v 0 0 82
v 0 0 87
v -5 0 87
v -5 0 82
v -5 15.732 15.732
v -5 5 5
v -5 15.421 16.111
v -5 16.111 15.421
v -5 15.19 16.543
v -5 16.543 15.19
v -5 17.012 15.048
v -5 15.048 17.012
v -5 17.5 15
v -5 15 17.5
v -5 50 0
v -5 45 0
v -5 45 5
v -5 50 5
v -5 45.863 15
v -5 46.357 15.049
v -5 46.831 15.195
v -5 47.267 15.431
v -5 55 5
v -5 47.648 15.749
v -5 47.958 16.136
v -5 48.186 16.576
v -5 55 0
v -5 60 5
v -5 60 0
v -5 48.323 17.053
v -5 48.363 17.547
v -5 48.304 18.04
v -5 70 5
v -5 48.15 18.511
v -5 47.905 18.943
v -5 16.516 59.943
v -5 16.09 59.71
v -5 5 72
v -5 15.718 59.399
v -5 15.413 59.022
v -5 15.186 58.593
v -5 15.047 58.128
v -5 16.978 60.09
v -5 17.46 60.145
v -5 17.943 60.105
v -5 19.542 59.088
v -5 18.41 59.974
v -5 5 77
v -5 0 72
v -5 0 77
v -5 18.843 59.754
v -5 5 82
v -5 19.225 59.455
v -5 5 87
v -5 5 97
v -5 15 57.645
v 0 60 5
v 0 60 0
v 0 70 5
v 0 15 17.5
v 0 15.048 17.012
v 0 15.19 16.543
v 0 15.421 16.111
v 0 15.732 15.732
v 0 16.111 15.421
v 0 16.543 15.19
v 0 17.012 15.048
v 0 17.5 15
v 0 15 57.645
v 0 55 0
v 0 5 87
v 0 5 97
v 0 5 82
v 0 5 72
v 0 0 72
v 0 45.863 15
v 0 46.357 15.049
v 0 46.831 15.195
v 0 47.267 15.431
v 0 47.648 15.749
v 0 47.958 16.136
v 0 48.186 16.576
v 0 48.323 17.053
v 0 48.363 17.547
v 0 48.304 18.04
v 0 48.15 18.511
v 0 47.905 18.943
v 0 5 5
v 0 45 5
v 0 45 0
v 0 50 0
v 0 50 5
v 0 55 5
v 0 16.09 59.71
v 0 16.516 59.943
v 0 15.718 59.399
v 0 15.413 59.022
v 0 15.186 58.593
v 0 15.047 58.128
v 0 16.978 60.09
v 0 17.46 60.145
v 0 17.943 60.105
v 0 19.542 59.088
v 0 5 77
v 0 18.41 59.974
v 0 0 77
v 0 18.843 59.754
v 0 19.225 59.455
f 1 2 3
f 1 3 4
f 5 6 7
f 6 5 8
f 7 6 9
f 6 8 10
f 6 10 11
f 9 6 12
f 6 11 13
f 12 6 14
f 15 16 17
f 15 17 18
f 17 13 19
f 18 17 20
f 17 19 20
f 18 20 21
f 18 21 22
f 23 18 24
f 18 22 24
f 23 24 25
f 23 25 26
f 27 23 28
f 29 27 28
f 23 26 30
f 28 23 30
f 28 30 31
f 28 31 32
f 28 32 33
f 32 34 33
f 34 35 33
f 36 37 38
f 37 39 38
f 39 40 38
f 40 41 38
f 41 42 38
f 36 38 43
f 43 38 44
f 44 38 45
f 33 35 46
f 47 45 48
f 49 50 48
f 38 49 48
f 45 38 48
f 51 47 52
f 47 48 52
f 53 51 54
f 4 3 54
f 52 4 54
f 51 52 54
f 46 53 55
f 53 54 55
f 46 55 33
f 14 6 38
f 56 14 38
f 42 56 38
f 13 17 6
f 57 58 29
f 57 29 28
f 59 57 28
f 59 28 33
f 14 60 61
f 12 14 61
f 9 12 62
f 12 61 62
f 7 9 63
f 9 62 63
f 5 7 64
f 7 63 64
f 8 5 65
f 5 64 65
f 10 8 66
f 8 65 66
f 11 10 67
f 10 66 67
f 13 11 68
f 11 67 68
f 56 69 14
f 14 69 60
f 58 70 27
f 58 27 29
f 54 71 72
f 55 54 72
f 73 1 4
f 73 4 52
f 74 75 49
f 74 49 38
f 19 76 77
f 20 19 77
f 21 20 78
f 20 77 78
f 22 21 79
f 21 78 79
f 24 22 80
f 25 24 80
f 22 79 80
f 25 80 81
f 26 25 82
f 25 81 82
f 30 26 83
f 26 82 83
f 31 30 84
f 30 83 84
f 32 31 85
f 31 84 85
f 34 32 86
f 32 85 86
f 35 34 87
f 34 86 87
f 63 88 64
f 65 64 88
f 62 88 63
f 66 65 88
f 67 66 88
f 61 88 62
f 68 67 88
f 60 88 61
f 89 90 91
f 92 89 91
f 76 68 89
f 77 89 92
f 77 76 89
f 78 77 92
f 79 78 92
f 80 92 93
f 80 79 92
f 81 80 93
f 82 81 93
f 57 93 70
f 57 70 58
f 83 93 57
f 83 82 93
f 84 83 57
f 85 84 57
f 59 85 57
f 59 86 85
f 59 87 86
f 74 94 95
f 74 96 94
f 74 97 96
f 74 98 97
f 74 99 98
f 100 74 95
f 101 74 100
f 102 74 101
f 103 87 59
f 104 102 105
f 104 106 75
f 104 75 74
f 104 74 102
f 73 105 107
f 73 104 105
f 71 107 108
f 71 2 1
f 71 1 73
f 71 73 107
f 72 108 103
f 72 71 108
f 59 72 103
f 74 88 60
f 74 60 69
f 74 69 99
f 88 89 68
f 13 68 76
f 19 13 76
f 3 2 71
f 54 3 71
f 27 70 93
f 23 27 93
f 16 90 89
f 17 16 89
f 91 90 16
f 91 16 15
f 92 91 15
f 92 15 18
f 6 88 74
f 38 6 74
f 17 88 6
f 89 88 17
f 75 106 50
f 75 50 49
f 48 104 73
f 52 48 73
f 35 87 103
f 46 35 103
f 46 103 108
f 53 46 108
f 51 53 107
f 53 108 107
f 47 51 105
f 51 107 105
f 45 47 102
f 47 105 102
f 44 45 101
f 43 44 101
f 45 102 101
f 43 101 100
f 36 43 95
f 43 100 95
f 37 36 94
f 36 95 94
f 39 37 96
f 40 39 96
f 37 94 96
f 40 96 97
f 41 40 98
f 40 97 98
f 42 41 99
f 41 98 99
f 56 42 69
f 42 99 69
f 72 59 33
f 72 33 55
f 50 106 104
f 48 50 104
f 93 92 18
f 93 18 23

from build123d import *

# Parameters (mm, degrees)
F1_DEPTH = 5
F3_DEPTH = 5.001
F4_W     = 5
F4_H     = 10
F4_H_2   = 5
F4_H_3   = 67
F4_W_2   = 40
F4_W_3   = 10
F5_DEPTH = 5.001


with BuildPart() as f1:
    # F0 (on Right) → F1 (new body)
    with BuildSketch(Plane.YZ):
        Polygon((5, 97), (0, 97), (0, 0), (70, 0), (70, 5), align=None)
    extrude(amount=-F1_DEPTH)

    # F2 (on face) → F3 (cut, through all)
    with BuildSketch(Plane.YZ):
        with BuildLine():
            ThreePointArc((19.541804, 59.087683), (16.743201, 60.027803), (15, 57.645104))
            Line((15, 57.645104), (15, 17.5))
            ThreePointArc((15, 17.5), (15.732233, 15.732233), (17.5, 15))
            Line((17.5, 15), (45.863388, 15))
            ThreePointArc((45.863388, 15), (48.083349, 16.350315), (47.905193, 18.942579))
            Line((47.905193, 18.942579), (19.541804, 59.087683))
        make_face()
    extrude(amount=-F3_DEPTH, mode=Mode.SUBTRACT)

    # F4 (on face) → F5 (cut, through all)
    with BuildSketch(Plane.YZ):
        with Locations((2.5, 92)):
            Rectangle(F4_W, F4_H)
        with Locations((2.5, 79.5)):
            Rectangle(F4_W, F4_H_2)
        with Locations((2.5, 38.5)):
            Rectangle(F4_W, F4_H_3)
        with Locations((25, 2.5)):
            Rectangle(F4_W_2, F4_H_2)
        with Locations((2.5, 2.5)):
            Rectangle(F4_W, F4_H_2)
        with Locations((52.5, 2.5)):
            Rectangle(F4_W, F4_H_2)
        with Locations((65, 2.5)):
            Rectangle(F4_W_3, F4_H_2)
    extrude(amount=-F5_DEPTH, mode=Mode.SUBTRACT)


solid = f1.part
